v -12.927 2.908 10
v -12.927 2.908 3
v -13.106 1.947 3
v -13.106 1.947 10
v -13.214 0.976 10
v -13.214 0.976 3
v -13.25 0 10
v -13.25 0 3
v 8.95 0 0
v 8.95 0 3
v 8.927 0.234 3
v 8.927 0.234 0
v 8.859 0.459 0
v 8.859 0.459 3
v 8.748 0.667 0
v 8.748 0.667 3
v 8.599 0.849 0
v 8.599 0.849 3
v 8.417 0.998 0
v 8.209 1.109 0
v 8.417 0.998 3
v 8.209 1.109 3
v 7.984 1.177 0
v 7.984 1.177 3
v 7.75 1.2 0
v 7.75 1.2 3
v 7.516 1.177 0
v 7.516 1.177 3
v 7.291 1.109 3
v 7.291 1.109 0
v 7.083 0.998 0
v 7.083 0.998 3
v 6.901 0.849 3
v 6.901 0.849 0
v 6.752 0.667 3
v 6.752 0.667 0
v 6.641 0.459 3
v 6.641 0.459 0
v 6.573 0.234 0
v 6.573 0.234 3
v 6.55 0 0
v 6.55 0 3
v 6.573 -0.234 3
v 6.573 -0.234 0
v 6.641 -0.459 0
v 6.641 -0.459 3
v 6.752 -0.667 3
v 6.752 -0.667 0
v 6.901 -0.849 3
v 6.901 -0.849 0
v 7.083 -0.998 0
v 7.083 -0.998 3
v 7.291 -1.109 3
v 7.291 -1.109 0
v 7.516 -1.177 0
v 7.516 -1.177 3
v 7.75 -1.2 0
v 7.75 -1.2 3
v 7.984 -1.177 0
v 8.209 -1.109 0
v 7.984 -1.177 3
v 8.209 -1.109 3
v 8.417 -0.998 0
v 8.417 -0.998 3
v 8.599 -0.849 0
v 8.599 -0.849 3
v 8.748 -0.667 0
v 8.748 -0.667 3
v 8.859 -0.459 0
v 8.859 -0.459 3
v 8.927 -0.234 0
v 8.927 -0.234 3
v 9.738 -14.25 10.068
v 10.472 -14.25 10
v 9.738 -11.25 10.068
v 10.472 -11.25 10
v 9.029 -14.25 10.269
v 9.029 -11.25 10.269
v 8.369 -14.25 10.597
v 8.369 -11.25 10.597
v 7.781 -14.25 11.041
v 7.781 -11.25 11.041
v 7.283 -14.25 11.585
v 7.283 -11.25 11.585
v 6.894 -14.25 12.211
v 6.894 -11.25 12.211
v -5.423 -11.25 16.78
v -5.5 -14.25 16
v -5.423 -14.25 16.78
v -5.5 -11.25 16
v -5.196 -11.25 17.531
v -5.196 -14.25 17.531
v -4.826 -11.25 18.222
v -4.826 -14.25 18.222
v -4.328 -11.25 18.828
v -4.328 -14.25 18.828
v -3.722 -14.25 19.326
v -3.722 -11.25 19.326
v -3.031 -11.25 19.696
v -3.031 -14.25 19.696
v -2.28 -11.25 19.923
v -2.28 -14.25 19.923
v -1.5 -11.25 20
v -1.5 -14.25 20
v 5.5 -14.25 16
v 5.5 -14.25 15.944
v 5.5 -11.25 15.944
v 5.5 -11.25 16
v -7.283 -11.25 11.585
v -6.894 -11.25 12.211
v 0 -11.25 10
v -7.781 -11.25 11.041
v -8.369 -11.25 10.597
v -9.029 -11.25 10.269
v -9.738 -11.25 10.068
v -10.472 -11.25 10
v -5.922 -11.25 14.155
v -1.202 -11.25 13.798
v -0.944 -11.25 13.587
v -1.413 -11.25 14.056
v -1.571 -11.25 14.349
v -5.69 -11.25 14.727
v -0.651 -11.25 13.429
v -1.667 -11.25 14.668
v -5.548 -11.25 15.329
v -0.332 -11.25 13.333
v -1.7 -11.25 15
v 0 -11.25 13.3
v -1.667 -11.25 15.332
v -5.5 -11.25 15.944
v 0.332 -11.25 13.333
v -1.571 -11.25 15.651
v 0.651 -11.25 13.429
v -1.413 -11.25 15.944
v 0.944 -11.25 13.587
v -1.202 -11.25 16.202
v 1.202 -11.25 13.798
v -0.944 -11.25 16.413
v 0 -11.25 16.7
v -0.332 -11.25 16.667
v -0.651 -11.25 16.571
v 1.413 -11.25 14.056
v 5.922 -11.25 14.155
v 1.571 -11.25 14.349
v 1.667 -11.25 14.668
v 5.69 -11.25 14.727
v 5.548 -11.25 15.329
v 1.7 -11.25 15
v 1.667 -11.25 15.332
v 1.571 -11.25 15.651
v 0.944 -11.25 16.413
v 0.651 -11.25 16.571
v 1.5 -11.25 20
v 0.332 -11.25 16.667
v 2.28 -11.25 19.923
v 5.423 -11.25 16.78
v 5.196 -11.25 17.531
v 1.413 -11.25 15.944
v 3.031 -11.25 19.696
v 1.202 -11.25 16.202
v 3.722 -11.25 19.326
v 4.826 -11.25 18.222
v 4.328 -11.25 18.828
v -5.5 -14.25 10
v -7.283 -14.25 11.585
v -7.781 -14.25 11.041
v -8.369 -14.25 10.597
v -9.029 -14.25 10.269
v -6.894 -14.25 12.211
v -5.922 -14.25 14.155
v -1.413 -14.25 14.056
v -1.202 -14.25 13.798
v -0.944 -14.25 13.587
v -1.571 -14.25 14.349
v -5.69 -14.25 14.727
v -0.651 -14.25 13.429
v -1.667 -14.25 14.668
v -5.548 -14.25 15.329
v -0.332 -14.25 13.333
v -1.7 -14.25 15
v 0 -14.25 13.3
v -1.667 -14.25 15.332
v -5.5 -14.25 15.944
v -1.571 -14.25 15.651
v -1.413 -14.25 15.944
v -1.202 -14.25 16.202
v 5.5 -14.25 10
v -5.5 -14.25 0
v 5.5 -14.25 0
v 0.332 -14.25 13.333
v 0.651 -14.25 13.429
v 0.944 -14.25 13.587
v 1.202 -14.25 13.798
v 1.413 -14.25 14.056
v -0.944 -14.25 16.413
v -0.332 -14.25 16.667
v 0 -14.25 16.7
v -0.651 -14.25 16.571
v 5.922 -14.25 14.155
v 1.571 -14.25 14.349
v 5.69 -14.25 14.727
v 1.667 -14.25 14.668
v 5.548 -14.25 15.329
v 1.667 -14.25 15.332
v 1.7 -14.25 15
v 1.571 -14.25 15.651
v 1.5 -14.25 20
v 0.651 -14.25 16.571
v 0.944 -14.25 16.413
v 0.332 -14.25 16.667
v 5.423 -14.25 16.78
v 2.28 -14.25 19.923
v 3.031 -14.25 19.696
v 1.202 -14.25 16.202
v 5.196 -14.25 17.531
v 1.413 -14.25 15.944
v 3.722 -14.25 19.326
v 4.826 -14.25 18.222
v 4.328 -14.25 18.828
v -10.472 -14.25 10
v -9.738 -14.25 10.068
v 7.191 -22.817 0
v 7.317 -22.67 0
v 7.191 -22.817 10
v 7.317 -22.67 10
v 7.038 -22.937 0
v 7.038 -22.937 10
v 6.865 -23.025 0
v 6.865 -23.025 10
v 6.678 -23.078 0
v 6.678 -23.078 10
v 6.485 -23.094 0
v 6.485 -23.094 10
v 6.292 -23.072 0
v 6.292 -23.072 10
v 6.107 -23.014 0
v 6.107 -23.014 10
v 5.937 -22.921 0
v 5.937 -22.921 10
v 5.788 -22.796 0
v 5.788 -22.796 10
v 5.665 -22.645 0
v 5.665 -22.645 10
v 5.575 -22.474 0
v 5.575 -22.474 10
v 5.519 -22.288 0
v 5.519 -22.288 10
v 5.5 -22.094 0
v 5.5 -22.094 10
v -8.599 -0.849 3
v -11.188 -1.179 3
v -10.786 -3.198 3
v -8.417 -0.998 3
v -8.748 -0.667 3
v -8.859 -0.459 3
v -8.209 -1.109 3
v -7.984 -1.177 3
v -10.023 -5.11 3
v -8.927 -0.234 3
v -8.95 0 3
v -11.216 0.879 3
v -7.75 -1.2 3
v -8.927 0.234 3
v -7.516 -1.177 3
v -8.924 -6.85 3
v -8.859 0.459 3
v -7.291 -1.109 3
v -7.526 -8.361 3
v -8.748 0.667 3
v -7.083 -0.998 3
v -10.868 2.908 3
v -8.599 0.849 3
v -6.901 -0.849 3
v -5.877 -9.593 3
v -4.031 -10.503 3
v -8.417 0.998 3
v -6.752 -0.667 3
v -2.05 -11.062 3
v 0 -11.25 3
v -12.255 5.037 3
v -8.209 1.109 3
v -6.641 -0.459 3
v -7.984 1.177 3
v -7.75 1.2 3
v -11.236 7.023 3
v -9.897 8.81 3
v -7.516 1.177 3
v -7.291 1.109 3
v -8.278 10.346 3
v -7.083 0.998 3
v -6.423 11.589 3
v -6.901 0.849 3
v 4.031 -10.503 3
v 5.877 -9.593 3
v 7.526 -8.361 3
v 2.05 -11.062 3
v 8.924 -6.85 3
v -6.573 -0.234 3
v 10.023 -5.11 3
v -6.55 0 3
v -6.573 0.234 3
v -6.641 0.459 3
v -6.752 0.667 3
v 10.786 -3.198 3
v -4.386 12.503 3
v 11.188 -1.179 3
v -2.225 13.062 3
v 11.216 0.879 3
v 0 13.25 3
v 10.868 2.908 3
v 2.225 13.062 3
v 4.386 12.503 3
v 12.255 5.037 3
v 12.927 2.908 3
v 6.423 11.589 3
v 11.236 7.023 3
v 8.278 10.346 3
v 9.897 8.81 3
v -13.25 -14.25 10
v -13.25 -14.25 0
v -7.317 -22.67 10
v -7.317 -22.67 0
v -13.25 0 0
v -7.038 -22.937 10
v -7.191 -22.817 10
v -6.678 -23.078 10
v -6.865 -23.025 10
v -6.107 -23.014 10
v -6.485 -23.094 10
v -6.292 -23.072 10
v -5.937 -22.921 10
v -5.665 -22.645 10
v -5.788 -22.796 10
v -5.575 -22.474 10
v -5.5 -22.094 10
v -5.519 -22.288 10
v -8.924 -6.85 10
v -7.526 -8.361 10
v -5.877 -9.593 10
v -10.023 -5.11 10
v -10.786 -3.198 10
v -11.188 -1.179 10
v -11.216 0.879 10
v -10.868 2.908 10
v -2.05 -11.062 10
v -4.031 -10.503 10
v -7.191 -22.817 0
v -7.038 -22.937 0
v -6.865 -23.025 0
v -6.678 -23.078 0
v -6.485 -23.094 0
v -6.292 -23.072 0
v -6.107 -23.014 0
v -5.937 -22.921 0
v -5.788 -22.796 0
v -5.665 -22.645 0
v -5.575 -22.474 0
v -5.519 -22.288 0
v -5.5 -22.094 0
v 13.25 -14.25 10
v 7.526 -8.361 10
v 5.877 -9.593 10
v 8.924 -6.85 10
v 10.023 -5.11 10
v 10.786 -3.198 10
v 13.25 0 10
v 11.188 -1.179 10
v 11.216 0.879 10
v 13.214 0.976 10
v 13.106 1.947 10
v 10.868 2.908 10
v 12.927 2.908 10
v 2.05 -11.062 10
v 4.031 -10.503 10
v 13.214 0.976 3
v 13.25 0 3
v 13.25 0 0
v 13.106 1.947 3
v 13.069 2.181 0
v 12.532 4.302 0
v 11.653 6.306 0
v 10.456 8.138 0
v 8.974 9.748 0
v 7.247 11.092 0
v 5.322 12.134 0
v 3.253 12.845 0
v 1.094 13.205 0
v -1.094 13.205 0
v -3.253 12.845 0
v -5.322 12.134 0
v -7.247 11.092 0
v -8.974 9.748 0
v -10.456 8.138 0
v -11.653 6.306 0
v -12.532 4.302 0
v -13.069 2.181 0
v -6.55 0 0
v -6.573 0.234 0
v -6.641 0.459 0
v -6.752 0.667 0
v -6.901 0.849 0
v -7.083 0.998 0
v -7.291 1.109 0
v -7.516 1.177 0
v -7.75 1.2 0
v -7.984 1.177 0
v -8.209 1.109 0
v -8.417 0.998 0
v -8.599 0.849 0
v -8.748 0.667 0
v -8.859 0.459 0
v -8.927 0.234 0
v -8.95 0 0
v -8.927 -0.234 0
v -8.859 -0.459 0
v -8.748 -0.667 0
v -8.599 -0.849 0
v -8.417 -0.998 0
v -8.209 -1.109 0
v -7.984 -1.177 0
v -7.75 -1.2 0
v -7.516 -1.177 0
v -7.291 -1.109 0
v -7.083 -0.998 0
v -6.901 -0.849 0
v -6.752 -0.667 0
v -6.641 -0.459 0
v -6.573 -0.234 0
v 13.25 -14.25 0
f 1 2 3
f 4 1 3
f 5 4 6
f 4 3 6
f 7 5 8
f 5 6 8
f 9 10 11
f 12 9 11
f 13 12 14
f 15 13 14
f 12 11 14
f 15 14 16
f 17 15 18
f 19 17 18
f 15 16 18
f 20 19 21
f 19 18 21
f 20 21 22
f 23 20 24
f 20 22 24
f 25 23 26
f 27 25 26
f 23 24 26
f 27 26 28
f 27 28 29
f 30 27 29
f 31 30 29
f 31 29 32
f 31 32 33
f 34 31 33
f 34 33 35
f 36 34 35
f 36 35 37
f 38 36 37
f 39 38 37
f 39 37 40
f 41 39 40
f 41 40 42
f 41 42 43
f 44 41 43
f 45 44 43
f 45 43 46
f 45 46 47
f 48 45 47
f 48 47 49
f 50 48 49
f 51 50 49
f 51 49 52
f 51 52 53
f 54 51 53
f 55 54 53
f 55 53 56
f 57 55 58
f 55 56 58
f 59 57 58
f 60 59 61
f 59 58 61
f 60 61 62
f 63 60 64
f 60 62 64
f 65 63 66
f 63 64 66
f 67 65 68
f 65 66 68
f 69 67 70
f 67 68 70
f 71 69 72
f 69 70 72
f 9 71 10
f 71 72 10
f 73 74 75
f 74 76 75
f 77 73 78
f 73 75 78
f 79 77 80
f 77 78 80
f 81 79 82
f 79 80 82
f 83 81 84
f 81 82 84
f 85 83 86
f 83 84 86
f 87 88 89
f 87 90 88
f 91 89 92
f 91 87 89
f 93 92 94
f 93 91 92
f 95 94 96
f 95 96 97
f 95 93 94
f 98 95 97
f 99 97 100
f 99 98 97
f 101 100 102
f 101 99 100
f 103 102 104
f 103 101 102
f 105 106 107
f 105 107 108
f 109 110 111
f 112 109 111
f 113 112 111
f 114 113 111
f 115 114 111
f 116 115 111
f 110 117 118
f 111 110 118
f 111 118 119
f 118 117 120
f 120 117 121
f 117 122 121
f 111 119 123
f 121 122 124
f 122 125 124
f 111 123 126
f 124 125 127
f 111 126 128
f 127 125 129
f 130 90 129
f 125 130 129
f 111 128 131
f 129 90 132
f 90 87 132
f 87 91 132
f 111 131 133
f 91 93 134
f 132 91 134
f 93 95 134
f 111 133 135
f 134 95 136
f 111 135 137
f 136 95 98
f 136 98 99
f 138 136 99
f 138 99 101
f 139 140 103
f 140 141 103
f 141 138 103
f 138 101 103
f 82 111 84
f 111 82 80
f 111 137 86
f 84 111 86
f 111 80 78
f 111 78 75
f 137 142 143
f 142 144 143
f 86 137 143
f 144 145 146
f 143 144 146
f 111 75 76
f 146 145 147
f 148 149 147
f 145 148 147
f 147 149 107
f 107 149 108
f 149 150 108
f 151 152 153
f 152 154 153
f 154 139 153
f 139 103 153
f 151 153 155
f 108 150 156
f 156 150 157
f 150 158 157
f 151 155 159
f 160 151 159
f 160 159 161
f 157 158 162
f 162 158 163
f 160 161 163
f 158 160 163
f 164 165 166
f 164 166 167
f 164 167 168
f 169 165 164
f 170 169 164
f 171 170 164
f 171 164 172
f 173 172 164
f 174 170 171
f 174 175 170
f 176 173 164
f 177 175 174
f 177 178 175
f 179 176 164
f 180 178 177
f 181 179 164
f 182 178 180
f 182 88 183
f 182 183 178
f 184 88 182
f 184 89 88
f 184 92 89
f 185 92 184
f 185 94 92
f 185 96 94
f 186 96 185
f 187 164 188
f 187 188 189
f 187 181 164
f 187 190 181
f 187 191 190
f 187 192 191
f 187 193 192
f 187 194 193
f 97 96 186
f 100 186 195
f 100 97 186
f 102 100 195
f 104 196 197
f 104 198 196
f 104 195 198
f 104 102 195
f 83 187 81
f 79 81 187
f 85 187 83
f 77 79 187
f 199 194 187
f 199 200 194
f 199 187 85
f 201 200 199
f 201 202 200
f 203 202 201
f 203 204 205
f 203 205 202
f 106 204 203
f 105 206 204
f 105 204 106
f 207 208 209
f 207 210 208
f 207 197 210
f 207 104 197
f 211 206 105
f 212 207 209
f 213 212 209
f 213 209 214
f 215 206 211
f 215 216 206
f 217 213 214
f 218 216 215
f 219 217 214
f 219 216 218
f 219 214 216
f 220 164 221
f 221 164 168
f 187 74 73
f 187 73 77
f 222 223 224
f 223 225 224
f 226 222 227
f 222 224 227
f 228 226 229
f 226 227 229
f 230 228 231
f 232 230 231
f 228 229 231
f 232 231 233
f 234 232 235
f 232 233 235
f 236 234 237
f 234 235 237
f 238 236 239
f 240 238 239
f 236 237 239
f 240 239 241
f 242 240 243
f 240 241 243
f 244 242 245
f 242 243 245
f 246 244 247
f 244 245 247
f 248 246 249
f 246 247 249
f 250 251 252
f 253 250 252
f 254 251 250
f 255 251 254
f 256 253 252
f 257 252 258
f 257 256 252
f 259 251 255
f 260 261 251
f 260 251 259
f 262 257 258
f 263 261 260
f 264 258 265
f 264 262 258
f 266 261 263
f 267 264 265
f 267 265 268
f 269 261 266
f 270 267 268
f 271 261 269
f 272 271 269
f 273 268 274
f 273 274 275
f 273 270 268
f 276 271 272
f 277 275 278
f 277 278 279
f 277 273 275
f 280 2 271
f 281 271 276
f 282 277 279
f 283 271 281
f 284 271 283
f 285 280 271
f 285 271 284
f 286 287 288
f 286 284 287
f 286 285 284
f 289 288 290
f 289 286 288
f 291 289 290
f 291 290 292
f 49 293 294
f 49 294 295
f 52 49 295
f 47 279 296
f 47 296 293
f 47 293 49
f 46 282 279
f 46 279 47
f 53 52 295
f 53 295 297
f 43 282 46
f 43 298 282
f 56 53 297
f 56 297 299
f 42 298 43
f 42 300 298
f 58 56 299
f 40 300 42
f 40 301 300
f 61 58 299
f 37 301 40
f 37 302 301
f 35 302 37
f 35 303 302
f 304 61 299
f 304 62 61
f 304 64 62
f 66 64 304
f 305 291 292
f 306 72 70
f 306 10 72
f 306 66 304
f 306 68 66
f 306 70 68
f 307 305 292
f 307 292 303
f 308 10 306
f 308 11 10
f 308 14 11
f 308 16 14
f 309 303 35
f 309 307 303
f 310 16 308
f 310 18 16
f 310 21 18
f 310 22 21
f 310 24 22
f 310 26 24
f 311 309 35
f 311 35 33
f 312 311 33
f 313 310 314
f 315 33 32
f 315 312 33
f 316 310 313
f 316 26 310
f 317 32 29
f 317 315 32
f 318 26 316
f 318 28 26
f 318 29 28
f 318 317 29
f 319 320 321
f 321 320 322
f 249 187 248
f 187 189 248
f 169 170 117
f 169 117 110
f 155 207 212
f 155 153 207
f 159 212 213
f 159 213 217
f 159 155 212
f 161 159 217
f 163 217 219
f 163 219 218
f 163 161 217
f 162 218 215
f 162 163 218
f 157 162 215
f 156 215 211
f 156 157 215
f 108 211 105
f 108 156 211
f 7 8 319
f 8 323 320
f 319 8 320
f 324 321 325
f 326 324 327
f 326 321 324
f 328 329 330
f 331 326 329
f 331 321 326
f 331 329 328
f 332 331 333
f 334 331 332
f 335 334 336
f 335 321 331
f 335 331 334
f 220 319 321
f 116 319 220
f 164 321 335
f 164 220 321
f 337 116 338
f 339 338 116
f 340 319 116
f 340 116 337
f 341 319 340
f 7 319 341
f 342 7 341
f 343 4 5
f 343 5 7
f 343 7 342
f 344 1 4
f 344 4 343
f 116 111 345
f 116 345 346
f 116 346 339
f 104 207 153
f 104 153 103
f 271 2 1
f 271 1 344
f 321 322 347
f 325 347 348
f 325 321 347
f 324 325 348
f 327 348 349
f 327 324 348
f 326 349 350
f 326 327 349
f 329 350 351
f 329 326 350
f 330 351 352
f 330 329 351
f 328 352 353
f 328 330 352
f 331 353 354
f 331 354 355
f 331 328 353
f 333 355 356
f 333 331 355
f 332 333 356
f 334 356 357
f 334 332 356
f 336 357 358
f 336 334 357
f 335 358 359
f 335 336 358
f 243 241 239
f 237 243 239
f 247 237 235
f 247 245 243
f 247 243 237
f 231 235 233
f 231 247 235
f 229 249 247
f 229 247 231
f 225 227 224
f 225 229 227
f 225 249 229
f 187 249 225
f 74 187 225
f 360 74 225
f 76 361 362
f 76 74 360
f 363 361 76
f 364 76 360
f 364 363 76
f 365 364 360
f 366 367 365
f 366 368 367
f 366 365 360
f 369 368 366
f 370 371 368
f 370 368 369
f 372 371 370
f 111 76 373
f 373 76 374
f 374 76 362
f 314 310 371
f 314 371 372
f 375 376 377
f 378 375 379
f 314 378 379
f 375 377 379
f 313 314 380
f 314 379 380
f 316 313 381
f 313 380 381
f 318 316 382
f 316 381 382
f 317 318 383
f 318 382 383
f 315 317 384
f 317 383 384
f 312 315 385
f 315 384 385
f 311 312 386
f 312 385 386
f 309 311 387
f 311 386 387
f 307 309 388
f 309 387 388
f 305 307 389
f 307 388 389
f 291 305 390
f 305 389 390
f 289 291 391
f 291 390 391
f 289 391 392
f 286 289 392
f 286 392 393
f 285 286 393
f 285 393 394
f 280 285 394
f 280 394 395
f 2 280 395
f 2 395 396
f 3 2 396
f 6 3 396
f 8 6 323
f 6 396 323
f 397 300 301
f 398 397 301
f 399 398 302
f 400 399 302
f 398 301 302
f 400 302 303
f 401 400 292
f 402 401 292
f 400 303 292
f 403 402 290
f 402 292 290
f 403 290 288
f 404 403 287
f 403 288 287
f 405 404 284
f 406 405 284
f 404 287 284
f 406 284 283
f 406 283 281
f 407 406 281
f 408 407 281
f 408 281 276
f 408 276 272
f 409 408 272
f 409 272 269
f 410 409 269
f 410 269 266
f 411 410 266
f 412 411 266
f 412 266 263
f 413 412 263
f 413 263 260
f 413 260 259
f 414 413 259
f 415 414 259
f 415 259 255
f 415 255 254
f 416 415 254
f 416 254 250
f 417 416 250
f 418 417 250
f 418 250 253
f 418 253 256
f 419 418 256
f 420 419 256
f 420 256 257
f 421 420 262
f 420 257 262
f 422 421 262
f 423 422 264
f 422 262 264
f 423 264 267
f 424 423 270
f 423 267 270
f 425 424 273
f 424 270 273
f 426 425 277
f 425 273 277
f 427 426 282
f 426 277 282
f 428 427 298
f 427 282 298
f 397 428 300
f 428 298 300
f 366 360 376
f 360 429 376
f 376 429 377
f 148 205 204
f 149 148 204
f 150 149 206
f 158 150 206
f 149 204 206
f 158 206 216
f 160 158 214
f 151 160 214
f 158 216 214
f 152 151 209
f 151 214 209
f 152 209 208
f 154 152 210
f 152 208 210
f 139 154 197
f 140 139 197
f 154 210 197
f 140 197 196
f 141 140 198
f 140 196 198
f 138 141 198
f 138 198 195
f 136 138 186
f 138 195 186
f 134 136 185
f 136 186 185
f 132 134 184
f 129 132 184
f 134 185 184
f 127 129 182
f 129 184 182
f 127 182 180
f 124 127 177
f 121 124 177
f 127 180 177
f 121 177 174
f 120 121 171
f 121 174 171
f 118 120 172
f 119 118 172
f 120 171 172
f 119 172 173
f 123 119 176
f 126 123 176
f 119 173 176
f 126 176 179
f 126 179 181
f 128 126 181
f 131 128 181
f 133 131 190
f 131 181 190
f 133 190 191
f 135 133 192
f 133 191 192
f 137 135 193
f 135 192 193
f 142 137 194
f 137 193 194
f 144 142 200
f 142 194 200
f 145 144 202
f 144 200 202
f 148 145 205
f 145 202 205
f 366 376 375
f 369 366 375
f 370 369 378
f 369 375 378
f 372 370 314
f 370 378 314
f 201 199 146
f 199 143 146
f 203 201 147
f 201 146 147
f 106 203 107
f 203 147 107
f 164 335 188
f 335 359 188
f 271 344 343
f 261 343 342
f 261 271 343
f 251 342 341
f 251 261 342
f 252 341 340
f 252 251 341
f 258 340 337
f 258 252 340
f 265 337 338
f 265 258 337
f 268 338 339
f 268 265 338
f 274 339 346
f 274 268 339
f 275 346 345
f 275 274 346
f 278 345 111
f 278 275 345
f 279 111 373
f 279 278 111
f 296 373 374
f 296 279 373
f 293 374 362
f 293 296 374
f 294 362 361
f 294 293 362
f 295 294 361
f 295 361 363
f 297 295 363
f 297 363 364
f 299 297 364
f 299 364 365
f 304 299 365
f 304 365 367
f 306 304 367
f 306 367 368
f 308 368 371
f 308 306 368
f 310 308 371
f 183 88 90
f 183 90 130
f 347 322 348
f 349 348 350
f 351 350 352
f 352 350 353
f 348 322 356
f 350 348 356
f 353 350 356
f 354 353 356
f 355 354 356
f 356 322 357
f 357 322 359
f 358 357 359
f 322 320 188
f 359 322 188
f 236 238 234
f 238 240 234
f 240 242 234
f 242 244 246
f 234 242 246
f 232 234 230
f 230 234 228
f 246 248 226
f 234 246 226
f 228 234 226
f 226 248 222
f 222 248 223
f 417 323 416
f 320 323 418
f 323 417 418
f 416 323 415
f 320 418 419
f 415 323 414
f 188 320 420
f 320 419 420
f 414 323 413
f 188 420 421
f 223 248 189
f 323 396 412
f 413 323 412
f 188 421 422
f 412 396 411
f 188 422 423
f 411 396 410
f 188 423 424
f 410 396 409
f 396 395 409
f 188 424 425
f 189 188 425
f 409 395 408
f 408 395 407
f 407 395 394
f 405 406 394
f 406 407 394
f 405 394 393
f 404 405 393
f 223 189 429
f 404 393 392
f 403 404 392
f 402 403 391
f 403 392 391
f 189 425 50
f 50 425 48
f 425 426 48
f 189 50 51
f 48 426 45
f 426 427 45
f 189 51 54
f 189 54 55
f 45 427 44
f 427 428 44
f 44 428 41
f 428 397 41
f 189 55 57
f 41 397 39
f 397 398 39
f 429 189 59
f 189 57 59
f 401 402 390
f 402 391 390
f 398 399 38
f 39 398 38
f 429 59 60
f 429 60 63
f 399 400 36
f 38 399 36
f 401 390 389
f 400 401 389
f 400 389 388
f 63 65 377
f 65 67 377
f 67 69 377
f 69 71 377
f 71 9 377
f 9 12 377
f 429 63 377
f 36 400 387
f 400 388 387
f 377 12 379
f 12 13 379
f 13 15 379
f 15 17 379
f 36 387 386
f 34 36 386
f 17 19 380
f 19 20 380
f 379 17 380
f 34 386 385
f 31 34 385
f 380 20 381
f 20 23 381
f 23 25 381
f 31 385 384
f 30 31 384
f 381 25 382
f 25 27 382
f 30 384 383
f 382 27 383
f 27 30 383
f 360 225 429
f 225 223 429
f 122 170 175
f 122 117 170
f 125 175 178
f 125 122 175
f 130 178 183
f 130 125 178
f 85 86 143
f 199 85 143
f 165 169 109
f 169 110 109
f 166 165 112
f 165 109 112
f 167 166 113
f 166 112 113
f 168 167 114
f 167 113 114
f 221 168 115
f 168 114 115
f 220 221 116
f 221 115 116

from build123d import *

# Parameters (mm, degrees)
PAD_DEPTH    = 3
PAD001_DEPTH = 7
SKETCH001_R  = 1.2
POCKET_DEPTH = 3.001
SKETCH003_R  = 1.7
PAD002_DEPTH = 3
FILLET_R     = 4
FILLET001_R  = 1


with BuildPart() as part:
    # Sketch → Pad (new body)
    with BuildSketch(Plane.XY):
        with BuildLine():
            Line((5.5, -14.25), (5.5, -25.25))
            Line((5.5, -25.25), (13.25, -14.25))
            Line((13.25, -14.25), (13.25, 0))
            ThreePointArc((13.25, 0), (0, 13.25), (-13.25, 0))
            Line((-13.25, -14.25), (-13.25, 0))
            Line((-13.25, -14.25), (-5.5, -25.25))
            Line((-5.5, -25.25), (-5.5, -14.25))
            Line((-5.5, -14.25), (5.5, -14.25))
        make_face()
    extrude(amount=PAD_DEPTH)

    # Sketch002 → Pad001 (join)
    with BuildSketch(Plane.XY.offset(3)):
        with BuildLine():
            Line((-13.25, 0), (-13.25, -14.25))
            Line((-13.25, -14.25), (-5.5, -25.25))
            Line((-5.5, -25.25), (-5.5, -14.25))
            Line((-5.5, -14.25), (5.5, -14.25))
            Line((5.5, -14.25), (5.5, -25.25))
            Line((5.5, -25.25), (13.25, -14.25))
            Line((13.25, -14.25), (13.25, 0))
            ThreePointArc((13.25, 0), (13.169004, 1.462815), (12.927007, 2.907747))
            Line((10.867728, 2.907747), (12.927007, 2.907747))
            ThreePointArc((-10.867728, 2.907747), (0, -11.25), (10.867728, 2.907747))
            Line((-12.927007, 2.907747), (-10.867728, 2.907747))
            ThreePointArc((-12.927007, 2.907747), (-13.169004, 1.462815), (-13.25, 0))
        make_face()
    extrude(amount=PAD001_DEPTH)

    # Sketch001 (on Face10 of Pad) → Pocket (cut, through all)
    with BuildSketch(Plane.XY.offset(3)):
        with Locations((-7.75, 0)):
            Circle(SKETCH001_R)
        with Locations((7.75, 0)):
            Circle(SKETCH001_R)
    extrude(amount=-POCKET_DEPTH, mode=Mode.SUBTRACT)

    # Sketch003 (on Face19 of Pocket) → Pad002 (join)
    with BuildSketch(Plane.XZ.offset(14.25)):
        Polygon((-5.5, 15), (-8, 10), (8, 10), (5.5, 15), (5.5, 20), (-5.5, 20), align=None)
        with Locations((0, 15)):
            Circle(SKETCH003_R, mode=Mode.SUBTRACT)
    extrude(amount=-PAD002_DEPTH)

    # Fillet
    fillet_edges = [part.edges().sort_by_distance(p)[0] for p in [
        (-5.5, -12.75, 15),
        (-5.5, -12.75, 20),
        (-8, -12.75, 10),
        (8, -12.75, 10),
        (5.5, -12.75, 15),
        (5.5, -12.75, 20),
    ]]
    fillet(fillet_edges, radius=FILLET_R)

    # Fillet001
    fillet001_edges = [part.edges().sort_by_distance(p)[0] for p in [
        (5.5, -25.25, 6.5),
        (5.5, -25.25, 1.5),
        (-5.5, -25.25, 6.5),
        (-5.5, -25.25, 1.5),
    ]]
    fillet(fillet001_edges, radius=FILLET001_R)


solid = part.part
